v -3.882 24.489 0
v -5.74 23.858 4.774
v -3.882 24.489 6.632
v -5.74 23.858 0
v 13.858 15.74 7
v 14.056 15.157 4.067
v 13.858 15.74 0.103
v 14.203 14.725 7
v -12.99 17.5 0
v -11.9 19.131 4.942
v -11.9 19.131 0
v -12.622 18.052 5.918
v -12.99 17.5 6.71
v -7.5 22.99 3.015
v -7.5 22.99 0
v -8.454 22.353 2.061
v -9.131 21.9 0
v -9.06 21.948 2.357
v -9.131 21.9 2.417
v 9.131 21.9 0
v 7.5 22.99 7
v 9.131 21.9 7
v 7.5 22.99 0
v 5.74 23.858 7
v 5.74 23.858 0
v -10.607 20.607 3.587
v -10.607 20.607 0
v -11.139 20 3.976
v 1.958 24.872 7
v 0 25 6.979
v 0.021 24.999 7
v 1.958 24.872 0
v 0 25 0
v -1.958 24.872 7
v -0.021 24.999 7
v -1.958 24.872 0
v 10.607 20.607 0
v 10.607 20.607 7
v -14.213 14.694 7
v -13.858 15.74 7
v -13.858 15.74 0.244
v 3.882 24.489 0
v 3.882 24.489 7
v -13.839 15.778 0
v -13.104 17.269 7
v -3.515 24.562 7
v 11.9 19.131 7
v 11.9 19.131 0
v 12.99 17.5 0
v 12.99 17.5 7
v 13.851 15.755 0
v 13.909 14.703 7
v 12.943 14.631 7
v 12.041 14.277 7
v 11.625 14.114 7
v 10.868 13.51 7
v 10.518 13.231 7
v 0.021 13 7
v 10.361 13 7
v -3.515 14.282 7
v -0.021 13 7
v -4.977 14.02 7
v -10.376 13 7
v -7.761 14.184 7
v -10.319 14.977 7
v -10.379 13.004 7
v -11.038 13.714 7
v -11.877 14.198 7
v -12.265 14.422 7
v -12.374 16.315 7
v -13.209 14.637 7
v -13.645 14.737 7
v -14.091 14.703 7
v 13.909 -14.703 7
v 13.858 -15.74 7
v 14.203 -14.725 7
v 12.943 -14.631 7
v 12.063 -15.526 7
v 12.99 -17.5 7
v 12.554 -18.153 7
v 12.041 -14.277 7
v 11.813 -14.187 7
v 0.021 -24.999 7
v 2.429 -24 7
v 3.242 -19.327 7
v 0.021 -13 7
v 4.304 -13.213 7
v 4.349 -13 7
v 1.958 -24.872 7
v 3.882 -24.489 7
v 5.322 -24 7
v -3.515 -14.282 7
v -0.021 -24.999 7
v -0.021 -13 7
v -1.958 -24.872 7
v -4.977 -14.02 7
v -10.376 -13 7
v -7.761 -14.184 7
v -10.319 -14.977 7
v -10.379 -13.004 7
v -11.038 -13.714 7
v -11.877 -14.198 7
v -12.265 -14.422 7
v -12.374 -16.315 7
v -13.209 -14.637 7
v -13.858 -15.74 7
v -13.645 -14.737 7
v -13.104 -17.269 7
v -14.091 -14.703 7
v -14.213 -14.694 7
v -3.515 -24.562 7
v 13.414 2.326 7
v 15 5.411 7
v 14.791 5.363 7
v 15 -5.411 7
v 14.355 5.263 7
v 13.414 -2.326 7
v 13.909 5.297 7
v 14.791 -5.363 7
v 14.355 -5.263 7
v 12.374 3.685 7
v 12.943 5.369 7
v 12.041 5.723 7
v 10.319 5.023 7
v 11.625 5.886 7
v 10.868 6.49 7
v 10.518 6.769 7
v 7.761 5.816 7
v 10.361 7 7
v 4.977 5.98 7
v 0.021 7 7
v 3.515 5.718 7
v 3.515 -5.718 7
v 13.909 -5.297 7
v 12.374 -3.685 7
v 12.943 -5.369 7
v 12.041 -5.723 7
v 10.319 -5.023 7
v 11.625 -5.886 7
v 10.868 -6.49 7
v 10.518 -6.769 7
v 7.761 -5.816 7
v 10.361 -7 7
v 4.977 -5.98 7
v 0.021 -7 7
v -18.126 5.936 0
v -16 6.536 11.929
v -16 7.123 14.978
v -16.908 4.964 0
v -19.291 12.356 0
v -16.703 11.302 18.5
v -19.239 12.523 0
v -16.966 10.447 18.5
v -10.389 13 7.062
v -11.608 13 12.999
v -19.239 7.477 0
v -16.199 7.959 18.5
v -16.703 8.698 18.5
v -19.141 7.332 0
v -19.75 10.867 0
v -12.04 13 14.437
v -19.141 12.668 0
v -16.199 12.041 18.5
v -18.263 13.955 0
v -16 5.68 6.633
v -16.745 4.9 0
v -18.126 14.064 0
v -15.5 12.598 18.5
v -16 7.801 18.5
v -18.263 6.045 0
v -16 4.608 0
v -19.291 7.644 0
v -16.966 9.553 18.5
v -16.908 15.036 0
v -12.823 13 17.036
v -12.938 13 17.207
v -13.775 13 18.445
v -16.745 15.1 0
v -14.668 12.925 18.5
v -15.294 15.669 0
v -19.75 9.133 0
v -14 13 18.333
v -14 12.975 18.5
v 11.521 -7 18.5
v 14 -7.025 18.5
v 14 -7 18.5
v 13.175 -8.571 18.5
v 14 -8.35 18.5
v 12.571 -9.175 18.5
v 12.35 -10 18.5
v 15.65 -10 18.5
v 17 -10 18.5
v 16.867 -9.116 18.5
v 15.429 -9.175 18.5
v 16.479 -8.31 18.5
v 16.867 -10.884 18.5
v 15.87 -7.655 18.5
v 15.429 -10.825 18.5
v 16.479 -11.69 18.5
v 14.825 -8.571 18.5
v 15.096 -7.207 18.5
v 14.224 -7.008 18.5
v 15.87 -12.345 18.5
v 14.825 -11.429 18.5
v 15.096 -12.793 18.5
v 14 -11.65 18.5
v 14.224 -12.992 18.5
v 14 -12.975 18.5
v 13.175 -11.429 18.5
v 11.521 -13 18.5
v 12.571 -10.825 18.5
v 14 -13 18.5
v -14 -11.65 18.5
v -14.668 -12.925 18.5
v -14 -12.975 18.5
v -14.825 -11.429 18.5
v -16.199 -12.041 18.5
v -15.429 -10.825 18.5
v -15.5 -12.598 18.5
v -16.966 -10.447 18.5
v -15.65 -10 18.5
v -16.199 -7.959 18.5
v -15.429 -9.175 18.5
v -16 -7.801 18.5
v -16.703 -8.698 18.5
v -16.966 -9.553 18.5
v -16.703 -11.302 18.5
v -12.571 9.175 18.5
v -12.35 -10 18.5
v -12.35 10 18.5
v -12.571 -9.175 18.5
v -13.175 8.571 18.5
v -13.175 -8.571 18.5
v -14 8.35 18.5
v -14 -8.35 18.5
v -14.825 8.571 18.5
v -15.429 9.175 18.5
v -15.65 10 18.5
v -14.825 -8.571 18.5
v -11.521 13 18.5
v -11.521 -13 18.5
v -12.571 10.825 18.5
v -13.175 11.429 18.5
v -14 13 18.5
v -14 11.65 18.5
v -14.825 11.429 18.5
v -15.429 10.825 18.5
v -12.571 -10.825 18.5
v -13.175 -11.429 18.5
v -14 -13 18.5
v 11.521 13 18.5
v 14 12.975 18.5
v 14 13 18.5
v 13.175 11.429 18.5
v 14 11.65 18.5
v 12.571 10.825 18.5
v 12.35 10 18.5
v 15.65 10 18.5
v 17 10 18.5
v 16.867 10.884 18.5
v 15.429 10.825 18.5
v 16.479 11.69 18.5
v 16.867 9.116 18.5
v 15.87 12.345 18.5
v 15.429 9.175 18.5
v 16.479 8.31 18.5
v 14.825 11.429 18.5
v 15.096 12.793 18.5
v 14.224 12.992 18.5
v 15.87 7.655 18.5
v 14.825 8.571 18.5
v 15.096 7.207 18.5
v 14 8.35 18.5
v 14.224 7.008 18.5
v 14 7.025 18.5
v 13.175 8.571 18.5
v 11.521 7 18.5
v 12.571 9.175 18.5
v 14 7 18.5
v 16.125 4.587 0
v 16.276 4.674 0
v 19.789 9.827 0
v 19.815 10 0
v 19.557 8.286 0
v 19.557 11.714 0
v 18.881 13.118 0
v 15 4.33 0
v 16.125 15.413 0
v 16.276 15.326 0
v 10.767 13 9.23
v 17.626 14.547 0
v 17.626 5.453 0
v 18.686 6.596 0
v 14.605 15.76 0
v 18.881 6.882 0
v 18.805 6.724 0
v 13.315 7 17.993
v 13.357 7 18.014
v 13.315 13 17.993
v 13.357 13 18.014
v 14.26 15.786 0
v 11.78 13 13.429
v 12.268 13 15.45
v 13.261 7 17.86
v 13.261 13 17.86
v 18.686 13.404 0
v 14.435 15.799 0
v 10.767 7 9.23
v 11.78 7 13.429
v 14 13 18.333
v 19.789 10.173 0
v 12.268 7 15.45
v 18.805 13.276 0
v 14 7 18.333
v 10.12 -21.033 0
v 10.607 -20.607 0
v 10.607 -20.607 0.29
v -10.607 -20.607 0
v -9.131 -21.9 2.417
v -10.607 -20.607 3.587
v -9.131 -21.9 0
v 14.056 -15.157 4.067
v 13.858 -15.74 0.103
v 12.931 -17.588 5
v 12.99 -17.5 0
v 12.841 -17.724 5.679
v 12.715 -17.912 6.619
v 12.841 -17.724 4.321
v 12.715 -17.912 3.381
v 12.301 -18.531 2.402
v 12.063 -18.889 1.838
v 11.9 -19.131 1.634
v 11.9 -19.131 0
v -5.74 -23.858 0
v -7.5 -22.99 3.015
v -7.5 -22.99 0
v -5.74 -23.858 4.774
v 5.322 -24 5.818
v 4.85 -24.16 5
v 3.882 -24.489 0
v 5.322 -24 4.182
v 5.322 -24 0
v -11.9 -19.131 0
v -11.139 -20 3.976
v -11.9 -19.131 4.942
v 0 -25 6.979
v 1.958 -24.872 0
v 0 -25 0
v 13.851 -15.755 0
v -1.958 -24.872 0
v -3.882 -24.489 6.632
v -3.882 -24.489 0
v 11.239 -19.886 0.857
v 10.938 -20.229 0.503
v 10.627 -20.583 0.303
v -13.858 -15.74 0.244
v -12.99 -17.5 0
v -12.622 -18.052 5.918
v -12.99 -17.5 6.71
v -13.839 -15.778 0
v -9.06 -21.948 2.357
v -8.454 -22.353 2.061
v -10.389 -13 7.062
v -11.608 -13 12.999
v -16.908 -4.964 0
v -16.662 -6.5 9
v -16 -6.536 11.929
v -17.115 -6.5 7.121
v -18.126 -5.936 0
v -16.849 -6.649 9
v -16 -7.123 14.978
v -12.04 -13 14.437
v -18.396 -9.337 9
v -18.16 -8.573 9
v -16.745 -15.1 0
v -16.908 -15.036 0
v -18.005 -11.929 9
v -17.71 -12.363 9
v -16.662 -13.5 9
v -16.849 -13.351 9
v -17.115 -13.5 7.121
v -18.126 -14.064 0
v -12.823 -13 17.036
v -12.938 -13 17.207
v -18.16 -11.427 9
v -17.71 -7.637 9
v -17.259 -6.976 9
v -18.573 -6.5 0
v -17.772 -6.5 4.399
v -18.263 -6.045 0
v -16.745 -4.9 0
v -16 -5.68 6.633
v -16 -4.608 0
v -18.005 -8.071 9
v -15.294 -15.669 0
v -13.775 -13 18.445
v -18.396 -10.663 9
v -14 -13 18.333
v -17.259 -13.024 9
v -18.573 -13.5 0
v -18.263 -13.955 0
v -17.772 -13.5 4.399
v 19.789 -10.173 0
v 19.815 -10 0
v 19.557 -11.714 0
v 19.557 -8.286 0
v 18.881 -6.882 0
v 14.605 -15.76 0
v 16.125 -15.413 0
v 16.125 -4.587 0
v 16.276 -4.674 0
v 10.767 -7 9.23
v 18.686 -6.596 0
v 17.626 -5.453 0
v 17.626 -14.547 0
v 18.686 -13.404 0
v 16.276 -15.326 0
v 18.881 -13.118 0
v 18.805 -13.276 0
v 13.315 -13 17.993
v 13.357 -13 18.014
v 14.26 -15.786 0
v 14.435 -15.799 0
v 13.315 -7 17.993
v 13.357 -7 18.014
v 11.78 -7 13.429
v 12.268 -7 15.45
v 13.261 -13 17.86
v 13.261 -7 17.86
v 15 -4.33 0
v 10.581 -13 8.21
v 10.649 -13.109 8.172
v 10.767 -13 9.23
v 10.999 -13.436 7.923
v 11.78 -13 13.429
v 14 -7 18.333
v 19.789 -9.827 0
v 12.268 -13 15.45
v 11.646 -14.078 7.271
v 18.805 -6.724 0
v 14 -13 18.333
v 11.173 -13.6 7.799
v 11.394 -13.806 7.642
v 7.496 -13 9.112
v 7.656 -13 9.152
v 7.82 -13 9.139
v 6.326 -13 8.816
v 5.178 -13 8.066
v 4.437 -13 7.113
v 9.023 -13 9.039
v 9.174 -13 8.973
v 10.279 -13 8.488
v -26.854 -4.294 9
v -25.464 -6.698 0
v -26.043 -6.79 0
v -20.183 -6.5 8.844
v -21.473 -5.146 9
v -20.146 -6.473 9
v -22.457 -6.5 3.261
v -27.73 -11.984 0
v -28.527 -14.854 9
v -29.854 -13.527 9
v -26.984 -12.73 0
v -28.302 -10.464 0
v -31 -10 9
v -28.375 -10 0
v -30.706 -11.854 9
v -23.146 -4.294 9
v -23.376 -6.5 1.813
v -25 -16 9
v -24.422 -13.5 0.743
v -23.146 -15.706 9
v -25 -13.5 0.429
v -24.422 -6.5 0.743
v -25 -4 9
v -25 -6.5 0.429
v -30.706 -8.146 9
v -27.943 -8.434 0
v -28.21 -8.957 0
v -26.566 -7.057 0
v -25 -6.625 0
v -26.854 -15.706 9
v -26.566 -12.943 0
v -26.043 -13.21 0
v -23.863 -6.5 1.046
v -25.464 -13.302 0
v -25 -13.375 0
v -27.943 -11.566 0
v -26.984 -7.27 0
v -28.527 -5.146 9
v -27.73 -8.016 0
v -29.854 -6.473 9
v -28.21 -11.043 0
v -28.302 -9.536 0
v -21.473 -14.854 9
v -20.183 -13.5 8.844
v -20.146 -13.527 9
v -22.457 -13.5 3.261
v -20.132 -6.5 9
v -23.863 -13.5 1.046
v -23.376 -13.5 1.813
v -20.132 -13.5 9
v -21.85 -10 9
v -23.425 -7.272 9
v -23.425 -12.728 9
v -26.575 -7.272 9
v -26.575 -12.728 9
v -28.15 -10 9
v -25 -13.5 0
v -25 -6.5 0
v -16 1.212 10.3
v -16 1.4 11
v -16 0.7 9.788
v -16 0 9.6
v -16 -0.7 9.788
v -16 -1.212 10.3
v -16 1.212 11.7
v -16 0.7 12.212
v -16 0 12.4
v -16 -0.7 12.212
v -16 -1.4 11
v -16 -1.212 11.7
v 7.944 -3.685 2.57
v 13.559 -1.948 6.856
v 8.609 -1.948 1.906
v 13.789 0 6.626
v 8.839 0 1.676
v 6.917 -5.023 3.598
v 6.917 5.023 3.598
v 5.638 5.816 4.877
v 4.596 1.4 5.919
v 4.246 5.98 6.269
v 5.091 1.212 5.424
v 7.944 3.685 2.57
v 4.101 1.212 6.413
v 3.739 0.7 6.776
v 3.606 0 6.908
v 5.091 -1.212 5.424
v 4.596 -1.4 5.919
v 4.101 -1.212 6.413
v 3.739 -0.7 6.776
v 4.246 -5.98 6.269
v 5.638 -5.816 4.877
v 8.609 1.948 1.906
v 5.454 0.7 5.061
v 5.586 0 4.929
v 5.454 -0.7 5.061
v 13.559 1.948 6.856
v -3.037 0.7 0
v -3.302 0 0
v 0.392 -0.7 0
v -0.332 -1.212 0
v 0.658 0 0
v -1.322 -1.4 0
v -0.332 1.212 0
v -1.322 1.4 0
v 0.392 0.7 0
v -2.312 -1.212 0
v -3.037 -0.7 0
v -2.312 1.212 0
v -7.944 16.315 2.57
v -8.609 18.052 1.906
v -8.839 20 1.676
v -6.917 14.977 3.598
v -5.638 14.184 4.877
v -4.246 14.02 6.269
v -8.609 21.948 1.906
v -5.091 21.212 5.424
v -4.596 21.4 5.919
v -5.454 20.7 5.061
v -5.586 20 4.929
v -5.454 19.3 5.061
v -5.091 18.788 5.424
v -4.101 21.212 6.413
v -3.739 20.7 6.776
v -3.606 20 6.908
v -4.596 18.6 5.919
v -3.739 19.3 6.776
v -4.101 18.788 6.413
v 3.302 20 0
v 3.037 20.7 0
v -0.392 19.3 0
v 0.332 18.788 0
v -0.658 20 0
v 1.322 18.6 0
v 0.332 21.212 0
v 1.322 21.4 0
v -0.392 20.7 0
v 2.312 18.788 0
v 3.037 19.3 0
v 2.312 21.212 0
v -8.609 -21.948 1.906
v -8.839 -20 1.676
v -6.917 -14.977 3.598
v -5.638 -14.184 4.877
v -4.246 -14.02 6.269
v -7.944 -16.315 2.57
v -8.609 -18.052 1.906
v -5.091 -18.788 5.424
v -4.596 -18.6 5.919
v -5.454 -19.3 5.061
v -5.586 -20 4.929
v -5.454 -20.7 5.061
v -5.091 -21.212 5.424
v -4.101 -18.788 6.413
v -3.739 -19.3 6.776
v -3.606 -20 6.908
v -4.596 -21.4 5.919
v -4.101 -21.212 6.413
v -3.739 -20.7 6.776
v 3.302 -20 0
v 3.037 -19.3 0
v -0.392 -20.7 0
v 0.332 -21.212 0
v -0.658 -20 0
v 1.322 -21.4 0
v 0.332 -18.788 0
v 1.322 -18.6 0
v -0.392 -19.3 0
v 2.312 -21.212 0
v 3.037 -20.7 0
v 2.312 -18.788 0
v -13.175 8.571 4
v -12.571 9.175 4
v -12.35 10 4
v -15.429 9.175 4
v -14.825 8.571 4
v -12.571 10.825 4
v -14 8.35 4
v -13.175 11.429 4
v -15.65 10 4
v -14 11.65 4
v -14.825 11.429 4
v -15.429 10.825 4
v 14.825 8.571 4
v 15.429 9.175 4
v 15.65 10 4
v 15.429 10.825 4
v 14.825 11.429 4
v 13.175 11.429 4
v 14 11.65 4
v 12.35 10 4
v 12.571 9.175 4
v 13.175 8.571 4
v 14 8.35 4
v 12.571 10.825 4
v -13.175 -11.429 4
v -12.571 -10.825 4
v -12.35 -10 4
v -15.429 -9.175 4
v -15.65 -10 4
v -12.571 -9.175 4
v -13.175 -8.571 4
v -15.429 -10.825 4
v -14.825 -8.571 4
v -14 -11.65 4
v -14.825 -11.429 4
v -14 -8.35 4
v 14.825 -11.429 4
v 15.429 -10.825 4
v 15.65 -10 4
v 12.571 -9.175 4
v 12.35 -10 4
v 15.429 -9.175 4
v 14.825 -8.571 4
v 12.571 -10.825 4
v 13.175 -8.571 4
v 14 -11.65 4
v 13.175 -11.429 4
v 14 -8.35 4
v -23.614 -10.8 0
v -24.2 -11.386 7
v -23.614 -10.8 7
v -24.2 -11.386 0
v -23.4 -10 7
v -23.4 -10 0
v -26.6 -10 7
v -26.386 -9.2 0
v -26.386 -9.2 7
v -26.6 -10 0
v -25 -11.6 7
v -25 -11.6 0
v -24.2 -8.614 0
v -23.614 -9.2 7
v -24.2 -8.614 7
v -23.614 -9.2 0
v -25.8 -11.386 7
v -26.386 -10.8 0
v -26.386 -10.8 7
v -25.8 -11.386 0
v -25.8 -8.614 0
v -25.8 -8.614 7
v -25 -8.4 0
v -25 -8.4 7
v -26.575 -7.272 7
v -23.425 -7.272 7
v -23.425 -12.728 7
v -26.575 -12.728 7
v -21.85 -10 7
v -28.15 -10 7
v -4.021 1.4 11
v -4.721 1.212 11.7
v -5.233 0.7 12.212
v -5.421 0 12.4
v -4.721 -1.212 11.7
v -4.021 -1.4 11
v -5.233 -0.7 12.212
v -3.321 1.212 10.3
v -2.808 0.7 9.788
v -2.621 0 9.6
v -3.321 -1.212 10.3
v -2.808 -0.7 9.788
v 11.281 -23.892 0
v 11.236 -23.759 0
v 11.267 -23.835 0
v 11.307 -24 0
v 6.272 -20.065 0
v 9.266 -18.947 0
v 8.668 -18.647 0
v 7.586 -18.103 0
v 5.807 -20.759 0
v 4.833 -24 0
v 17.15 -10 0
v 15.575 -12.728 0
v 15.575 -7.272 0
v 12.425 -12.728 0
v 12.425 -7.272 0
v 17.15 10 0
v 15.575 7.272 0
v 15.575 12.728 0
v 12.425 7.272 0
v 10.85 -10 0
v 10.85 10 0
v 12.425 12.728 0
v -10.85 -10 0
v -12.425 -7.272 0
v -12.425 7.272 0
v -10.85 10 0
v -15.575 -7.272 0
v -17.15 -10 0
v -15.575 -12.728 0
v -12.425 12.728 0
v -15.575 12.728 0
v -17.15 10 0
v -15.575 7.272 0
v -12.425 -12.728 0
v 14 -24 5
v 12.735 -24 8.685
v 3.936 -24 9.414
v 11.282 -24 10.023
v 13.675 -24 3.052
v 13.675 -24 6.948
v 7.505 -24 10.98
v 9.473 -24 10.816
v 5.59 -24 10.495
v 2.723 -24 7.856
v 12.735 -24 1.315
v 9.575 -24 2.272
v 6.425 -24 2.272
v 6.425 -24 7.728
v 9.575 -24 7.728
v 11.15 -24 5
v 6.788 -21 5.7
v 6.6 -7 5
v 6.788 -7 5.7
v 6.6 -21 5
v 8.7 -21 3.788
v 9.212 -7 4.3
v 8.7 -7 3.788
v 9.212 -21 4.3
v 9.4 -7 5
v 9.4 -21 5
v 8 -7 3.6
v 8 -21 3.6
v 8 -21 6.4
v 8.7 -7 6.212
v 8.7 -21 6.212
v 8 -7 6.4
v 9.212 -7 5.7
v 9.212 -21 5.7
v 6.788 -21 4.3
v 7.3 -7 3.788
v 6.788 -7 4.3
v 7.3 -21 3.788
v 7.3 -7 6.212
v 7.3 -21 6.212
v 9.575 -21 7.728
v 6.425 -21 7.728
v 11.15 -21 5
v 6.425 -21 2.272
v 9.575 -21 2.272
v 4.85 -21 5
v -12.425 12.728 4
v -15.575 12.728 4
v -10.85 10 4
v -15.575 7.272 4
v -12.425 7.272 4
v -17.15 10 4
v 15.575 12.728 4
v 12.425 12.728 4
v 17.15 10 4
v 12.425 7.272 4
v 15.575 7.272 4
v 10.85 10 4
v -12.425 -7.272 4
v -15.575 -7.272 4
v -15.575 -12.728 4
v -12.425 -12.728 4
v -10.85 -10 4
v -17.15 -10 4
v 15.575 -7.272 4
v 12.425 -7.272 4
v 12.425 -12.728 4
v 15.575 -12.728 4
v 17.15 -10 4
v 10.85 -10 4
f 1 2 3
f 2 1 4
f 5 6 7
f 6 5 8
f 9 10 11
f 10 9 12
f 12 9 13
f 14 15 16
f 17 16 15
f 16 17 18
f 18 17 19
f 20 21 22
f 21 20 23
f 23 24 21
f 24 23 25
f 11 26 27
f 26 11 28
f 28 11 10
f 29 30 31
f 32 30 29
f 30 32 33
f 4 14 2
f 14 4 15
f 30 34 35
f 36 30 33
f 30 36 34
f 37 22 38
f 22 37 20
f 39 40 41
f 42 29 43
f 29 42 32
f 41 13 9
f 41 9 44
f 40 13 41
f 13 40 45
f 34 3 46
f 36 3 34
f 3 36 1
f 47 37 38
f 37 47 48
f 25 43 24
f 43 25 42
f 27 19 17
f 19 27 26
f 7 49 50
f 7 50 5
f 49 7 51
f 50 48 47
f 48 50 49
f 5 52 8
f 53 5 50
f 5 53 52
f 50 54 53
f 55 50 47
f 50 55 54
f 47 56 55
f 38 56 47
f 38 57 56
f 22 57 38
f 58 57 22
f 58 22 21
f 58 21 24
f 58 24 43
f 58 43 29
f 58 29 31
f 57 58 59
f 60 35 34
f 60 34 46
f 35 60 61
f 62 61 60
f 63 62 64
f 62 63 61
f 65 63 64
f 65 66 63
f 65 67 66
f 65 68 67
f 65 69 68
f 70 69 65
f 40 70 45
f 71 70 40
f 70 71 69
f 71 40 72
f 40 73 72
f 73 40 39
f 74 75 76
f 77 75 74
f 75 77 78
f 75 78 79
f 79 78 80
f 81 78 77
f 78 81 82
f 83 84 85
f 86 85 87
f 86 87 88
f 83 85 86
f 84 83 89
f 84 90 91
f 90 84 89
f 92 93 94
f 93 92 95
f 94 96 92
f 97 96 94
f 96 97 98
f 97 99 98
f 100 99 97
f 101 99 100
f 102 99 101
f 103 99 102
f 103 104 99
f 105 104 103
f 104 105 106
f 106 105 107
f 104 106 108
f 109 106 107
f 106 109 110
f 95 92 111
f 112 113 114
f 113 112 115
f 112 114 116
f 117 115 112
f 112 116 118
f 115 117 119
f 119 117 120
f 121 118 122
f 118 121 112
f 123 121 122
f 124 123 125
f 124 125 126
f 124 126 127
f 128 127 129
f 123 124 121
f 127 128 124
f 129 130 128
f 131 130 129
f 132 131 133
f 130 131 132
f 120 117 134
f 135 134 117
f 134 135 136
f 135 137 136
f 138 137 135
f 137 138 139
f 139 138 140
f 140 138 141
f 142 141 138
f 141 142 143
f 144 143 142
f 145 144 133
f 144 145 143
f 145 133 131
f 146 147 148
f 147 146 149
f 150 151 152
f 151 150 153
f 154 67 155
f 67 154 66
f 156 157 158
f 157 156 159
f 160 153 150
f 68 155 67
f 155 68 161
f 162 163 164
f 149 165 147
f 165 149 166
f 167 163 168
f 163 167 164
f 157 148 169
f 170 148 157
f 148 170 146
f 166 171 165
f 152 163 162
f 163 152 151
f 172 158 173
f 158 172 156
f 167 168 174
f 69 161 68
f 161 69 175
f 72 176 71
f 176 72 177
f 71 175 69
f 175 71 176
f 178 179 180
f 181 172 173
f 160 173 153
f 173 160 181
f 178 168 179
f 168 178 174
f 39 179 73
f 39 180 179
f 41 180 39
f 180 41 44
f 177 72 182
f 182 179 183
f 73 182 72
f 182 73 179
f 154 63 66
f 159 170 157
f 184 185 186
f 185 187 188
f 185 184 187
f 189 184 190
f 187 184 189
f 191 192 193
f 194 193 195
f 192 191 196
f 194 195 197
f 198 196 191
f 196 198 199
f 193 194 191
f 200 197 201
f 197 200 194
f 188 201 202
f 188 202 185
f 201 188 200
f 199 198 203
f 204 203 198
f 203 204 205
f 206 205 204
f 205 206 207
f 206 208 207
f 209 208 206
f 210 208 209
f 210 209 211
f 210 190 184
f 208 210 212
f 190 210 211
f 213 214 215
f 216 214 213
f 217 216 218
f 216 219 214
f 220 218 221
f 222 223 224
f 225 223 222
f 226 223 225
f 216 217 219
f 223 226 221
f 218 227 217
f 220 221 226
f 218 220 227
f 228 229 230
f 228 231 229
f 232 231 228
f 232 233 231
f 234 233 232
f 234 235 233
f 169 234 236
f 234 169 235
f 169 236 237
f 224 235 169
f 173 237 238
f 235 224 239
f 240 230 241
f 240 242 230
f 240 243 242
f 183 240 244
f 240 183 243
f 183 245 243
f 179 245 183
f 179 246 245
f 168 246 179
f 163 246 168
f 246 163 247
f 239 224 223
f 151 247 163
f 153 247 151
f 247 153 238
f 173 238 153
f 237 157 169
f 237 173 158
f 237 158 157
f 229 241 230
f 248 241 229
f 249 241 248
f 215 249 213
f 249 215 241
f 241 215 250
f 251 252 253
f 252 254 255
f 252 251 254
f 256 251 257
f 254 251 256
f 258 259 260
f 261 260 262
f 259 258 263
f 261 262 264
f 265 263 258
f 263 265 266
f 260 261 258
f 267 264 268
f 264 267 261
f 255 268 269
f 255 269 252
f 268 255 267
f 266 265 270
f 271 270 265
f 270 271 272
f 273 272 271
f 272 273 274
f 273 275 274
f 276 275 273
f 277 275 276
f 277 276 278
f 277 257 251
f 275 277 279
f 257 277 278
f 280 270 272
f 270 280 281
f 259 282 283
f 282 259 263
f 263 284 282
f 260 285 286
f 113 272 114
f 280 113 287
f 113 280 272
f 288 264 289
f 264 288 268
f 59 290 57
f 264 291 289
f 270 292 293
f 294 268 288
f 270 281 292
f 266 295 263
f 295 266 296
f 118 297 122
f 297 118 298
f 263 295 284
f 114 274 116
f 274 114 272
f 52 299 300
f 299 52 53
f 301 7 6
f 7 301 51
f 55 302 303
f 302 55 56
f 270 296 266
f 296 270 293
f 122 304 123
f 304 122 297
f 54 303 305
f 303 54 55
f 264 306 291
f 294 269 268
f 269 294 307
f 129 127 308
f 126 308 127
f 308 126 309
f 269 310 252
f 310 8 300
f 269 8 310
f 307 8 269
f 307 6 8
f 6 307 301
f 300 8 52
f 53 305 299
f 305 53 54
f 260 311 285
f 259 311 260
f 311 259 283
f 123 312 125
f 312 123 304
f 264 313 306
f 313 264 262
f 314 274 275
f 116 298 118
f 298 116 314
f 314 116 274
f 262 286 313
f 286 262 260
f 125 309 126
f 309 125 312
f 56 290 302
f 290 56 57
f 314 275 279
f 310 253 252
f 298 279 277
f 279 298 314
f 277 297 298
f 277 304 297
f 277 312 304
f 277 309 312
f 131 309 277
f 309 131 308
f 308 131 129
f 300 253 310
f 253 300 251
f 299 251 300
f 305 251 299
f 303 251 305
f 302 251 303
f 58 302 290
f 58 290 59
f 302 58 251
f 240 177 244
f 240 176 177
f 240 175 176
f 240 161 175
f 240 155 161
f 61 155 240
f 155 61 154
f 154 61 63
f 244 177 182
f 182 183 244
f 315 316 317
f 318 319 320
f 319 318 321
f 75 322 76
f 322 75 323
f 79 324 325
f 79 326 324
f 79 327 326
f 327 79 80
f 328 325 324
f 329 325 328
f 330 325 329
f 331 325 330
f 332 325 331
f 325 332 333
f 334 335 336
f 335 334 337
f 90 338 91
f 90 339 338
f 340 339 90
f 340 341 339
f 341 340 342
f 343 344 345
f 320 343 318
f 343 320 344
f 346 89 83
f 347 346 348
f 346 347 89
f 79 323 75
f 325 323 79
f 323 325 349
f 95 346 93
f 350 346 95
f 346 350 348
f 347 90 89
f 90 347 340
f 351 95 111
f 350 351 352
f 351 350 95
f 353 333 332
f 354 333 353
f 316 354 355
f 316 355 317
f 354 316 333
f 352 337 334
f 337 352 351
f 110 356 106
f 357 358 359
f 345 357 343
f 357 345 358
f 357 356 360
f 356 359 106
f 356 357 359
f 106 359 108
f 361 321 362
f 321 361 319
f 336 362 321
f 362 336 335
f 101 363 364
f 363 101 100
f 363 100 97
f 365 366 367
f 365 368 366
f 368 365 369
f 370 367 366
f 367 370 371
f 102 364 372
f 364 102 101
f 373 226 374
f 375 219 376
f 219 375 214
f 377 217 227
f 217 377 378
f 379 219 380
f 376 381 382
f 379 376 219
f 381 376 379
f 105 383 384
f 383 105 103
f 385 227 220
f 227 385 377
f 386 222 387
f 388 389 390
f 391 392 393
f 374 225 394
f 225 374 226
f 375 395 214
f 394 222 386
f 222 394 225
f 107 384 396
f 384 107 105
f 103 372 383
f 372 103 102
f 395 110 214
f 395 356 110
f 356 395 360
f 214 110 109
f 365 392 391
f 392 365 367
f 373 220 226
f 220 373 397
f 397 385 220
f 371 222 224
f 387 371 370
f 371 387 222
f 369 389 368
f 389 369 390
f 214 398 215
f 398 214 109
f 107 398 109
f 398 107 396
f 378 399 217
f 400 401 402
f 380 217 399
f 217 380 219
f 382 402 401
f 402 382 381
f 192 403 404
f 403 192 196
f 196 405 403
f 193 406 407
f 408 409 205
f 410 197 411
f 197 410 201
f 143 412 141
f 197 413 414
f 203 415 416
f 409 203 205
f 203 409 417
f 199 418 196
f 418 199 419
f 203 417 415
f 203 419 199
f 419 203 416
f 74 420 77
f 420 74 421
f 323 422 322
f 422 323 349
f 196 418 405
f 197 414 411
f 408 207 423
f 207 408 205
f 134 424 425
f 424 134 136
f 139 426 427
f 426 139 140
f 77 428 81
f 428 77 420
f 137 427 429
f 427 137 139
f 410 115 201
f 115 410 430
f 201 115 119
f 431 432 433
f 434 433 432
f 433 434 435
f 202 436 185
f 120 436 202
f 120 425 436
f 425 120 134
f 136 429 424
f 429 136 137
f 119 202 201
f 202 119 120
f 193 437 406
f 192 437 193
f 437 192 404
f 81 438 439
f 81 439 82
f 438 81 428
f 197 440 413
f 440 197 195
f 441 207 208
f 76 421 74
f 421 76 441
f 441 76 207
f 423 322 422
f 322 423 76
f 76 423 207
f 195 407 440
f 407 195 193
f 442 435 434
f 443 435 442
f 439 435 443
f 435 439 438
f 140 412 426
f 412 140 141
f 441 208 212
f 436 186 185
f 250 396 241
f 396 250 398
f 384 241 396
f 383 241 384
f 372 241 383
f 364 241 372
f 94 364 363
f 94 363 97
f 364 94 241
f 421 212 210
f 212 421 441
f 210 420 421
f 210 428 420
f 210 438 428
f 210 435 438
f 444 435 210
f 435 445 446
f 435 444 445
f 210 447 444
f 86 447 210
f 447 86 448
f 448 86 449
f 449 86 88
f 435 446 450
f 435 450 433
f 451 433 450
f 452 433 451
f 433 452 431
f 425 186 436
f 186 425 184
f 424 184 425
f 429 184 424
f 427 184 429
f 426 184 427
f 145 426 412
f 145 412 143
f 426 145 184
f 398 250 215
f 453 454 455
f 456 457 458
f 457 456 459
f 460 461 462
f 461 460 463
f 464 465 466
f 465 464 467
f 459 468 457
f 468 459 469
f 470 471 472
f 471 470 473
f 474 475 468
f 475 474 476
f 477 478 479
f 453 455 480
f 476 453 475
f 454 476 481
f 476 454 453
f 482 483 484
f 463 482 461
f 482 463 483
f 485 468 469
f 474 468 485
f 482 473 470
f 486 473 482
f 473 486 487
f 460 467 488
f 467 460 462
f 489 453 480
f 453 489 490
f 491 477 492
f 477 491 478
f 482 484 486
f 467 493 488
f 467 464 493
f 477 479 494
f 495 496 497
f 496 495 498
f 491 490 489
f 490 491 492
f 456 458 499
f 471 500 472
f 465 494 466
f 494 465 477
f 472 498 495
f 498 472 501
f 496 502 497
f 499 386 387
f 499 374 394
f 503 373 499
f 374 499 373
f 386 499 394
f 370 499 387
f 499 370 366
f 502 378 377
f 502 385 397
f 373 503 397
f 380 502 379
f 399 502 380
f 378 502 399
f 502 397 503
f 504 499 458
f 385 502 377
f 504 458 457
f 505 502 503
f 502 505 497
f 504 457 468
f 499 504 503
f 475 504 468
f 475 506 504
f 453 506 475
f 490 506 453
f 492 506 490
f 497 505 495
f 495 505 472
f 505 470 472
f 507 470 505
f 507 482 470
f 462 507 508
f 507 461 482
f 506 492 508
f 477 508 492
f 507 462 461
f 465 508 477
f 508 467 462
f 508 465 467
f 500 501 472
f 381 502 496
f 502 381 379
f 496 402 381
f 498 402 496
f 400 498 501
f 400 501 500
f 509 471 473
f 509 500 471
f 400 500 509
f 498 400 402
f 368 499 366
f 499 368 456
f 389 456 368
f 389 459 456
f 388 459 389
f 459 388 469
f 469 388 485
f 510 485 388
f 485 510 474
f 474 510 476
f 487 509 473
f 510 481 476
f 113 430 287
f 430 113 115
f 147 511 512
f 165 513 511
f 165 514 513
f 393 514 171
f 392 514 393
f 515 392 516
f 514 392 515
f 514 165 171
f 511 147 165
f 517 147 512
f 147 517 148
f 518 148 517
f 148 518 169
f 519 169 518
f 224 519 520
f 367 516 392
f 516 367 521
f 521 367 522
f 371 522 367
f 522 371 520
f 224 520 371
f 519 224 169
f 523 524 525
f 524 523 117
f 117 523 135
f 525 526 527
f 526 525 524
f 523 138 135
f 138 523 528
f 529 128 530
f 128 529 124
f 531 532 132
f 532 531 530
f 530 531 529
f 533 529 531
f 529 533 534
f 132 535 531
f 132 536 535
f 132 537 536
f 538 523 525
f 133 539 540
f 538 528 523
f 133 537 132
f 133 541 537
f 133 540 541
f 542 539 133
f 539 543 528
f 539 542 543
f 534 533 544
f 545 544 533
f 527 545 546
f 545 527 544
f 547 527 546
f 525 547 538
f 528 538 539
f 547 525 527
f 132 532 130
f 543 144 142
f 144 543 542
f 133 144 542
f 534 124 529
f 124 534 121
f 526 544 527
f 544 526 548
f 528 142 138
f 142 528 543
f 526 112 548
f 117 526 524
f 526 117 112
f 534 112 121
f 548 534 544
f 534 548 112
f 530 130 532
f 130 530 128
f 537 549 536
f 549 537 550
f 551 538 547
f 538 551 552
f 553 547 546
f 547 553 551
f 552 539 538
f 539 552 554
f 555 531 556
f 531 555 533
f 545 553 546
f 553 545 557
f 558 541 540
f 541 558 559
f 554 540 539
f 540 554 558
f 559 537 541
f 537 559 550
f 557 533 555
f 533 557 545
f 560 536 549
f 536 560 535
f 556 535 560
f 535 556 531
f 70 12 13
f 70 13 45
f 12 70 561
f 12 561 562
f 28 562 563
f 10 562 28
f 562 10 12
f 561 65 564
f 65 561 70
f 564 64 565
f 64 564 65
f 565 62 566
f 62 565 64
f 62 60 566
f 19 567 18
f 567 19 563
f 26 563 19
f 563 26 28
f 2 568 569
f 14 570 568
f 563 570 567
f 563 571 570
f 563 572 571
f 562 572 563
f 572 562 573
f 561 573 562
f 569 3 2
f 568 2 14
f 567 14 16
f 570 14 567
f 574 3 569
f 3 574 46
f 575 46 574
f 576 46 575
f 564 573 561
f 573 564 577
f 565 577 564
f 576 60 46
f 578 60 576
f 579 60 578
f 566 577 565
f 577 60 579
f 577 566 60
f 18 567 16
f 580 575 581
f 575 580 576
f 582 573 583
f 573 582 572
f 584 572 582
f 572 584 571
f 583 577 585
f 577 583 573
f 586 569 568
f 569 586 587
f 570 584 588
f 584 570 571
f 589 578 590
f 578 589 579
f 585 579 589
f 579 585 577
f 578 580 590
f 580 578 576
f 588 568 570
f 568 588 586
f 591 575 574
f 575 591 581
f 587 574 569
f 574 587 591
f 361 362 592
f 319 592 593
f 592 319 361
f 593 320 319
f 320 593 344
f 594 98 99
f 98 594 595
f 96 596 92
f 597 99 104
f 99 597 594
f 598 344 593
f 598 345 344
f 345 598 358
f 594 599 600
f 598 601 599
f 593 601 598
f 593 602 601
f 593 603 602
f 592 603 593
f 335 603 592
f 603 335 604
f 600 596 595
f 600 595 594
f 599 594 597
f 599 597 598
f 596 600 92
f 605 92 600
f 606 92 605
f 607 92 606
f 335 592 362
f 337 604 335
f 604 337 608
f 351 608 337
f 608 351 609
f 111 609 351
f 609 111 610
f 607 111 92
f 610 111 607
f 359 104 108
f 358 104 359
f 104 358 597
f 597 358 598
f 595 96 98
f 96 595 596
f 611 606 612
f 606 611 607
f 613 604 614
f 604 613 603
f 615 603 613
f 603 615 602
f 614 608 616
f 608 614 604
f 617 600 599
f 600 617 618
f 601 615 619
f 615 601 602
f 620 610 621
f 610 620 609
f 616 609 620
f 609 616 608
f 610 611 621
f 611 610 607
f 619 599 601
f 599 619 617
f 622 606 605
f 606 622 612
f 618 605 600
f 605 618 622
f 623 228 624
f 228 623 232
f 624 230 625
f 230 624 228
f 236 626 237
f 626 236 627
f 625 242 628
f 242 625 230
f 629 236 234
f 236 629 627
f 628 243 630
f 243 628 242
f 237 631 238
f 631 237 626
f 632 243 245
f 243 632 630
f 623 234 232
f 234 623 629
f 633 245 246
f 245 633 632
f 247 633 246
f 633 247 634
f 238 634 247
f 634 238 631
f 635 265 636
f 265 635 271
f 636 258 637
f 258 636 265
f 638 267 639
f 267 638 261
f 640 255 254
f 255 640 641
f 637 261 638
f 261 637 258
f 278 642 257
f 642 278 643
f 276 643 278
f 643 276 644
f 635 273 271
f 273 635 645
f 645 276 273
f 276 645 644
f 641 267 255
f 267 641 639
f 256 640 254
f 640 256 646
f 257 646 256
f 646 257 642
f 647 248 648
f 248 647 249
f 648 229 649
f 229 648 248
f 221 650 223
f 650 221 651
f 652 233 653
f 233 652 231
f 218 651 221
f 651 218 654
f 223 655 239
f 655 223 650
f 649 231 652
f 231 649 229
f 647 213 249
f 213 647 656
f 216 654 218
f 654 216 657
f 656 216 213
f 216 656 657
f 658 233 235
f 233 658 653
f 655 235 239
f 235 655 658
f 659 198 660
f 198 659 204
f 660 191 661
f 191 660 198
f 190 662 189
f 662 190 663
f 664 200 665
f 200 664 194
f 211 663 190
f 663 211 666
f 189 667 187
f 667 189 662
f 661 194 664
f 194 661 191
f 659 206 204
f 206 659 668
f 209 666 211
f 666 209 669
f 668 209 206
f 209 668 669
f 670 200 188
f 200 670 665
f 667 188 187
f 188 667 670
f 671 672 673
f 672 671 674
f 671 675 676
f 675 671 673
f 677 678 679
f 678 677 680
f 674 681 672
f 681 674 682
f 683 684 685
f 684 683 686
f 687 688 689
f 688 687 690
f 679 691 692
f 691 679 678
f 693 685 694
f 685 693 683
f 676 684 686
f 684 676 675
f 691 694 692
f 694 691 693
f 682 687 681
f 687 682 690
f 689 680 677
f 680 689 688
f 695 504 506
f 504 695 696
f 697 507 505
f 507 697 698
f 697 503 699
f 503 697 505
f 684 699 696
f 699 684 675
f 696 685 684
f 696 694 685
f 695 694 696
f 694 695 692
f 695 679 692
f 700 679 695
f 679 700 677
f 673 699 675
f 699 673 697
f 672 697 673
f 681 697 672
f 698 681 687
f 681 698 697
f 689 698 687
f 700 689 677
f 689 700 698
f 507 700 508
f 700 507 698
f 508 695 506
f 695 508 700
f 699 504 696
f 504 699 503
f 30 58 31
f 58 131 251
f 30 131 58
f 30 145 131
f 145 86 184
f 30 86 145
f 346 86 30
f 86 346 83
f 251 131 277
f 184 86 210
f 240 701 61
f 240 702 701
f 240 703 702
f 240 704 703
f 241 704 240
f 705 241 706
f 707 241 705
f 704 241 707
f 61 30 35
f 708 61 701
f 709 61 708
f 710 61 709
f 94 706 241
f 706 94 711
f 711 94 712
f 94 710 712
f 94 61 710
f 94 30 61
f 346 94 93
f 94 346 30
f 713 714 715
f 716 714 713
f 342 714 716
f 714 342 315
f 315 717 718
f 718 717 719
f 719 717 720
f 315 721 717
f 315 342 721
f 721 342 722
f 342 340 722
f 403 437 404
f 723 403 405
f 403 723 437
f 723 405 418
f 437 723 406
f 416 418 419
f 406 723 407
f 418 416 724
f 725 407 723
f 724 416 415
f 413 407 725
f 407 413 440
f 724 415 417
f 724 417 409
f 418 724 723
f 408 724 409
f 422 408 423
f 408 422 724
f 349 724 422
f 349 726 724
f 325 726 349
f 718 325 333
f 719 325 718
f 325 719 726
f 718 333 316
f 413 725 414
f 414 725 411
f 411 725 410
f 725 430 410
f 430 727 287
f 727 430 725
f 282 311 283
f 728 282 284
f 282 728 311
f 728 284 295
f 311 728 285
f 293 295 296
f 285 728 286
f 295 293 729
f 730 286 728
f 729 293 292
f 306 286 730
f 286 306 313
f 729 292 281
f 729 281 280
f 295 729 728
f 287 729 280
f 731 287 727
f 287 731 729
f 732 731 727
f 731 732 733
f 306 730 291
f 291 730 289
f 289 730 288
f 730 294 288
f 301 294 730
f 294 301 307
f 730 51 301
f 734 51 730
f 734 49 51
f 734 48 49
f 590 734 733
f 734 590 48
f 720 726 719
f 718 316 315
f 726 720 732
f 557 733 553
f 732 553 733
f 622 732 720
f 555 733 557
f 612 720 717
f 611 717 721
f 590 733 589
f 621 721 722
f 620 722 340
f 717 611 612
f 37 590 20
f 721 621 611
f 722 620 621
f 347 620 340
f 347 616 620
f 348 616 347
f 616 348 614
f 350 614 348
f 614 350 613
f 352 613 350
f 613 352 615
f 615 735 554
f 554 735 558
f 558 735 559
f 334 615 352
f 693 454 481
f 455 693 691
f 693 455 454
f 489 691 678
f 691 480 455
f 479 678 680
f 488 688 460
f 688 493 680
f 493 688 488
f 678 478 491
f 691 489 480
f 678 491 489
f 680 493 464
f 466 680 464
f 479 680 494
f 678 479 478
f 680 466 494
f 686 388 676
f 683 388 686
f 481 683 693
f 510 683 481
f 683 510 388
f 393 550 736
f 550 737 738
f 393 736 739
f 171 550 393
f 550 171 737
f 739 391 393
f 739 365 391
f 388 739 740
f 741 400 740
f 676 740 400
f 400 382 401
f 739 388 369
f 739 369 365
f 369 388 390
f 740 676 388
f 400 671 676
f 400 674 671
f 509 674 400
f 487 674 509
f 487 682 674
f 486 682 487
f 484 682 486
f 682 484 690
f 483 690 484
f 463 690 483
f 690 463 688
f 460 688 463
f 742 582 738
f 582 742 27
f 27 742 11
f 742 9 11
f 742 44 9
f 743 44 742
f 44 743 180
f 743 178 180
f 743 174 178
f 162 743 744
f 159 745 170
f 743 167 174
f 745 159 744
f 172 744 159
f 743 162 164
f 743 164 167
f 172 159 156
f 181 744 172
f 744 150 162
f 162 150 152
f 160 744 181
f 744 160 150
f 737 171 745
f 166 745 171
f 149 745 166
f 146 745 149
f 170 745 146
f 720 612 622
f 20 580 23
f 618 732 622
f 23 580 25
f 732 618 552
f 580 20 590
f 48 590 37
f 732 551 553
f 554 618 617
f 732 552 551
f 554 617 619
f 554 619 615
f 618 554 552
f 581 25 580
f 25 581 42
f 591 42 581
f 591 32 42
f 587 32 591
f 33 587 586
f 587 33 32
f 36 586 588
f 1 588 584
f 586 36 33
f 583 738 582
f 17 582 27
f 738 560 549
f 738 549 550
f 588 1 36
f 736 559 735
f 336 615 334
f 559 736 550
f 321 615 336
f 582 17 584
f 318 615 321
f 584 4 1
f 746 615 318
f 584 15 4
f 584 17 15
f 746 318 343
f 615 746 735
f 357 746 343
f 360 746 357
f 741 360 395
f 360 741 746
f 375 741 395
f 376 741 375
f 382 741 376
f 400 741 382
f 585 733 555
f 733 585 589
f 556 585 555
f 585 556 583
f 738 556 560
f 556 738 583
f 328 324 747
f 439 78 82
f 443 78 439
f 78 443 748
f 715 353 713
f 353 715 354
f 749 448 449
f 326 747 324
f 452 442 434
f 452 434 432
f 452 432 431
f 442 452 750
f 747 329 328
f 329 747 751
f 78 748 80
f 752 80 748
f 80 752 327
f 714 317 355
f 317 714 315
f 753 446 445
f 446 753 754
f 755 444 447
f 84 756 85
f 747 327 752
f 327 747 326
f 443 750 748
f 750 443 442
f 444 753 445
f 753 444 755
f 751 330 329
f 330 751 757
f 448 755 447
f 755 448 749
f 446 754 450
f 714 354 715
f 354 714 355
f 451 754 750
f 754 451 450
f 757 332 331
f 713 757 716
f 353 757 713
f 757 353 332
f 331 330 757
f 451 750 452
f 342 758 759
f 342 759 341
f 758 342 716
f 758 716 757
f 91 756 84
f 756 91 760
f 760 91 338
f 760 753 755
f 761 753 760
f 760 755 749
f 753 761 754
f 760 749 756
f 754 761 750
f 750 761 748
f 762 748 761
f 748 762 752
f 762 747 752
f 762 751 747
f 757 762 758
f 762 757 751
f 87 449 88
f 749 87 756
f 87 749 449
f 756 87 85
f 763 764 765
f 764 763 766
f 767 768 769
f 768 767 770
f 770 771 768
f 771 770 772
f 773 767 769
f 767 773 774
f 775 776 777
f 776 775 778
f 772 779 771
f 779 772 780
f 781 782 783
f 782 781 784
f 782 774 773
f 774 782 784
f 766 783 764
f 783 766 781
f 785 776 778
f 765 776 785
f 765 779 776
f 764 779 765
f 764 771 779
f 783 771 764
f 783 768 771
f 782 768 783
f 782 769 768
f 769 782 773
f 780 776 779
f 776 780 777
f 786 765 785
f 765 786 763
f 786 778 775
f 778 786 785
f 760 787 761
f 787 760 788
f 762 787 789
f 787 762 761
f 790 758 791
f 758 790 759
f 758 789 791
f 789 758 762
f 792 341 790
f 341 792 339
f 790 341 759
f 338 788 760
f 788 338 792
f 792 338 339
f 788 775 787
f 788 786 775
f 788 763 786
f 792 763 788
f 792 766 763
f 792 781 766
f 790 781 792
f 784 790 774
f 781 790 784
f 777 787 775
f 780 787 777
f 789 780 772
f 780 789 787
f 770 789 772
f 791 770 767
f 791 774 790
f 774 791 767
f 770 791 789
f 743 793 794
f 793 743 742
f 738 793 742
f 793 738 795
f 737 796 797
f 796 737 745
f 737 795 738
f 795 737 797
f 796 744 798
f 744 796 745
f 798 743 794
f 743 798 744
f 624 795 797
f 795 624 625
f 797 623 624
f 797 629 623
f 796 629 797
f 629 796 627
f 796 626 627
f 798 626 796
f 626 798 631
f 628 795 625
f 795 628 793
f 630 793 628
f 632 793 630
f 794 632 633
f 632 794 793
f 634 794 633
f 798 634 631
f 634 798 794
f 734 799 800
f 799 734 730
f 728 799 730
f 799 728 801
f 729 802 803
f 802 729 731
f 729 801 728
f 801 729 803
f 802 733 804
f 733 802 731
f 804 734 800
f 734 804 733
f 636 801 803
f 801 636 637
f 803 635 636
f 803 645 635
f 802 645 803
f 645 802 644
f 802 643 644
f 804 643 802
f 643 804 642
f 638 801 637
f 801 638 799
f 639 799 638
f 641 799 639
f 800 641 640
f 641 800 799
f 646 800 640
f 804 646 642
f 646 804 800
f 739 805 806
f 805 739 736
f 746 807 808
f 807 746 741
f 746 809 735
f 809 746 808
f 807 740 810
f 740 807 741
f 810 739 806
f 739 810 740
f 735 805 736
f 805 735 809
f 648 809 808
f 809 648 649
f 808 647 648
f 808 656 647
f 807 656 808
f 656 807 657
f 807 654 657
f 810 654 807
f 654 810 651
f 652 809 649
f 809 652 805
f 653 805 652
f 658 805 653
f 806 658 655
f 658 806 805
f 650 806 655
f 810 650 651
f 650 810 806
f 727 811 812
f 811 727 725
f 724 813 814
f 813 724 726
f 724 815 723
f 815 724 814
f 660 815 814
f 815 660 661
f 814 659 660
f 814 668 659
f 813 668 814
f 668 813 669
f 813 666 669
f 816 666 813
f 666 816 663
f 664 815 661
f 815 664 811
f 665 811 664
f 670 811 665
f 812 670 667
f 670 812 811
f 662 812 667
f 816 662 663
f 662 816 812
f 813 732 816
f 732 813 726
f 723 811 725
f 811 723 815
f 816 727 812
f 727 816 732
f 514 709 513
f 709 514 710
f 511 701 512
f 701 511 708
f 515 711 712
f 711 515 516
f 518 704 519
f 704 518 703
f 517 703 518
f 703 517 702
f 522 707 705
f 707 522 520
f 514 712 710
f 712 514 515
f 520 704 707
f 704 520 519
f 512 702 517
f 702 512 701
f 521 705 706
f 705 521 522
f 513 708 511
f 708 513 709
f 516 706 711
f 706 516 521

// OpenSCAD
// file: configuration.scad
// OD = outside diameter, corner to corner.
m3_nut_od = 6.1;
m3_nut_radius = (m3_nut_od+0.2)/2;

// Major diameter of metric 3mm thread.
m3_major = 2.85;
m3_radius = m3_major/2;
m3_wide_radius = 3.2/2;

// NEMA17 stepper motors.
motor_shaft_diameter = 5;
motor_shaft_radius = (motor_shaft_diameter+0.3)/2;

// Frame brackets.
thickness = 3.6;
// file: roller.scad
include <configuration.scad>;

bearing_offset = 20;
cone_radius = 6;

module roller() {
  // OpenBeam.
  % rotate([0, 0, 45]) cube([15, 15, 120], center=true);
  difference() {
    union() {
      for (z = [-bearing_offset / 2, bearing_offset / 2]) {
	// Big round ends.
	translate([0, 16, z]) rotate([90, 0, 0])
	  cylinder(h=8, r=15, center=true, $fn=48);
	// Screw guide tubes.
        translate([-14, 12, z]) rotate([90, 0, 0])
          cylinder(r1=cone_radius+0.5, r2=3, h=23, center=true);
        translate([14, 12, z]) rotate([90, 0, 0])
          cylinder(r1=cone_radius+0.5, r2=3, h=23, center=true);
	// Diagonal guide ramps.
	translate([0, 12, z]) cube([28, 23, 6], center=true);
      }
      // Waist.
      translate([0, 16, 0]) cube([30, 8, bearing_offset+2], center=true);
      // Connect guide tubes vertically.
      translate([-8, 12, 0])
	cube([16, 23, bearing_offset], center=true);
      // Attachment for diagonal rods.
      translate([-25, 16, bearing_offset/2]) {
	rotate([90, 0, 0])
	  cylinder(r1=2.5, r2=cone_radius, h=12, center=true, $fn=20);
	translate([5.5, 0, 0])
	  cube([11, 12, 7], center=true);
      }
    }
    // Inside space for OpenBeam.
    color([1, 0, 0]) rotate([0, 0, 45]) cube([17, 17, 120], center=true);
    // Smooth backside for print surface.
    translate([0, 22, 0]) cube([100, 6, 100], center=true);
    // Bearing mount surfaces.
    rotate([90, 0, 45]) translate([12.5, 0, -2.5]) {
      cylinder(r=6, h=7, center=true);
      cylinder(r=1.4, h=30, center=true, $fn=12);
    }
    for (y = [-bearing_offset, bearing_offset]) {
      rotate([90, 0, 135]) translate([12.5, y, 2.5]) {
        cylinder(r=6, h=7, center=true);
        cylinder(r=1.4, h=30, center=true, $fn=12);
      }
    }
    // Screw holes.
    for (z = [-bearing_offset/2, bearing_offset/2]) {
      translate([-14, 20, z]) rotate([90, 0, 0])
	cylinder(r=1.65, h=40, center=true, $fn=12);
      translate([14, 20, z]) rotate([90, 0, 0])
	cylinder(r=1.65, h=40, center=true, $fn=12);
      translate([-25, 18, z]) rotate([90, 0, 0])
	cylinder(r=1.6, h=20, center=true, $fn=12);
      translate([-25, 7, z]) rotate([90, 0, 0])
	cylinder(r=m3_nut_radius, h=10, center=true, $fn=6);
    }
  }
  // 623zz ball bearings.
  rotate([90, 0, 135]) translate([12.5, 20, 3.8])
    % cylinder(r=5, h=4, center=true);
  rotate([90, 0, 45]) translate([12.5, 0, -3.8])
    % cylinder(r=5, h=4, center=true);
  rotate([90, 0, 135]) translate([12.5, -20, 3.8])
    % cylinder(r=5, h=4, center=true);
}
// main file
include <roller.scad>;

module roller_left() {
  scale([1, -1, 1]) difference() {
    union() {
      roller();
      // Adjustable endstop screw.
      intersection() {
	translate([8, 14, bearing_offset-2])
	  cylinder(r1=4, r2=cone_radius, h=12, center=true);
	cube([90, 38, 90], center=true);
      }
    }
    // Fishline attachment in the front.
    translate([-10, 8, 0]) rotate([0, 90, 0]) #
      cylinder(r=1.4, h=30, center=true, $fn=12);
    // Adjustable endstop screw.
    translate([8, 14, bearing_offset+1]) {
      cylinder(r=1.4, h=28, center=true, $fn=12);
      cylinder(r=m3_nut_radius, h=10, $fn=6);
    }
    // Four nyloc nuts.
    for (z = [-bearing_offset/2, bearing_offset/2]) {
      for (x = [-14, 14]) {
	translate([x, 20, z]) rotate([90, 0, 0])
	  cylinder(r=m3_nut_radius, h=10, center=true, $fn=6);
      }
    }
  }
}

translate([0, 0, 19]) rotate([90, 0, 0]) roller_left();
